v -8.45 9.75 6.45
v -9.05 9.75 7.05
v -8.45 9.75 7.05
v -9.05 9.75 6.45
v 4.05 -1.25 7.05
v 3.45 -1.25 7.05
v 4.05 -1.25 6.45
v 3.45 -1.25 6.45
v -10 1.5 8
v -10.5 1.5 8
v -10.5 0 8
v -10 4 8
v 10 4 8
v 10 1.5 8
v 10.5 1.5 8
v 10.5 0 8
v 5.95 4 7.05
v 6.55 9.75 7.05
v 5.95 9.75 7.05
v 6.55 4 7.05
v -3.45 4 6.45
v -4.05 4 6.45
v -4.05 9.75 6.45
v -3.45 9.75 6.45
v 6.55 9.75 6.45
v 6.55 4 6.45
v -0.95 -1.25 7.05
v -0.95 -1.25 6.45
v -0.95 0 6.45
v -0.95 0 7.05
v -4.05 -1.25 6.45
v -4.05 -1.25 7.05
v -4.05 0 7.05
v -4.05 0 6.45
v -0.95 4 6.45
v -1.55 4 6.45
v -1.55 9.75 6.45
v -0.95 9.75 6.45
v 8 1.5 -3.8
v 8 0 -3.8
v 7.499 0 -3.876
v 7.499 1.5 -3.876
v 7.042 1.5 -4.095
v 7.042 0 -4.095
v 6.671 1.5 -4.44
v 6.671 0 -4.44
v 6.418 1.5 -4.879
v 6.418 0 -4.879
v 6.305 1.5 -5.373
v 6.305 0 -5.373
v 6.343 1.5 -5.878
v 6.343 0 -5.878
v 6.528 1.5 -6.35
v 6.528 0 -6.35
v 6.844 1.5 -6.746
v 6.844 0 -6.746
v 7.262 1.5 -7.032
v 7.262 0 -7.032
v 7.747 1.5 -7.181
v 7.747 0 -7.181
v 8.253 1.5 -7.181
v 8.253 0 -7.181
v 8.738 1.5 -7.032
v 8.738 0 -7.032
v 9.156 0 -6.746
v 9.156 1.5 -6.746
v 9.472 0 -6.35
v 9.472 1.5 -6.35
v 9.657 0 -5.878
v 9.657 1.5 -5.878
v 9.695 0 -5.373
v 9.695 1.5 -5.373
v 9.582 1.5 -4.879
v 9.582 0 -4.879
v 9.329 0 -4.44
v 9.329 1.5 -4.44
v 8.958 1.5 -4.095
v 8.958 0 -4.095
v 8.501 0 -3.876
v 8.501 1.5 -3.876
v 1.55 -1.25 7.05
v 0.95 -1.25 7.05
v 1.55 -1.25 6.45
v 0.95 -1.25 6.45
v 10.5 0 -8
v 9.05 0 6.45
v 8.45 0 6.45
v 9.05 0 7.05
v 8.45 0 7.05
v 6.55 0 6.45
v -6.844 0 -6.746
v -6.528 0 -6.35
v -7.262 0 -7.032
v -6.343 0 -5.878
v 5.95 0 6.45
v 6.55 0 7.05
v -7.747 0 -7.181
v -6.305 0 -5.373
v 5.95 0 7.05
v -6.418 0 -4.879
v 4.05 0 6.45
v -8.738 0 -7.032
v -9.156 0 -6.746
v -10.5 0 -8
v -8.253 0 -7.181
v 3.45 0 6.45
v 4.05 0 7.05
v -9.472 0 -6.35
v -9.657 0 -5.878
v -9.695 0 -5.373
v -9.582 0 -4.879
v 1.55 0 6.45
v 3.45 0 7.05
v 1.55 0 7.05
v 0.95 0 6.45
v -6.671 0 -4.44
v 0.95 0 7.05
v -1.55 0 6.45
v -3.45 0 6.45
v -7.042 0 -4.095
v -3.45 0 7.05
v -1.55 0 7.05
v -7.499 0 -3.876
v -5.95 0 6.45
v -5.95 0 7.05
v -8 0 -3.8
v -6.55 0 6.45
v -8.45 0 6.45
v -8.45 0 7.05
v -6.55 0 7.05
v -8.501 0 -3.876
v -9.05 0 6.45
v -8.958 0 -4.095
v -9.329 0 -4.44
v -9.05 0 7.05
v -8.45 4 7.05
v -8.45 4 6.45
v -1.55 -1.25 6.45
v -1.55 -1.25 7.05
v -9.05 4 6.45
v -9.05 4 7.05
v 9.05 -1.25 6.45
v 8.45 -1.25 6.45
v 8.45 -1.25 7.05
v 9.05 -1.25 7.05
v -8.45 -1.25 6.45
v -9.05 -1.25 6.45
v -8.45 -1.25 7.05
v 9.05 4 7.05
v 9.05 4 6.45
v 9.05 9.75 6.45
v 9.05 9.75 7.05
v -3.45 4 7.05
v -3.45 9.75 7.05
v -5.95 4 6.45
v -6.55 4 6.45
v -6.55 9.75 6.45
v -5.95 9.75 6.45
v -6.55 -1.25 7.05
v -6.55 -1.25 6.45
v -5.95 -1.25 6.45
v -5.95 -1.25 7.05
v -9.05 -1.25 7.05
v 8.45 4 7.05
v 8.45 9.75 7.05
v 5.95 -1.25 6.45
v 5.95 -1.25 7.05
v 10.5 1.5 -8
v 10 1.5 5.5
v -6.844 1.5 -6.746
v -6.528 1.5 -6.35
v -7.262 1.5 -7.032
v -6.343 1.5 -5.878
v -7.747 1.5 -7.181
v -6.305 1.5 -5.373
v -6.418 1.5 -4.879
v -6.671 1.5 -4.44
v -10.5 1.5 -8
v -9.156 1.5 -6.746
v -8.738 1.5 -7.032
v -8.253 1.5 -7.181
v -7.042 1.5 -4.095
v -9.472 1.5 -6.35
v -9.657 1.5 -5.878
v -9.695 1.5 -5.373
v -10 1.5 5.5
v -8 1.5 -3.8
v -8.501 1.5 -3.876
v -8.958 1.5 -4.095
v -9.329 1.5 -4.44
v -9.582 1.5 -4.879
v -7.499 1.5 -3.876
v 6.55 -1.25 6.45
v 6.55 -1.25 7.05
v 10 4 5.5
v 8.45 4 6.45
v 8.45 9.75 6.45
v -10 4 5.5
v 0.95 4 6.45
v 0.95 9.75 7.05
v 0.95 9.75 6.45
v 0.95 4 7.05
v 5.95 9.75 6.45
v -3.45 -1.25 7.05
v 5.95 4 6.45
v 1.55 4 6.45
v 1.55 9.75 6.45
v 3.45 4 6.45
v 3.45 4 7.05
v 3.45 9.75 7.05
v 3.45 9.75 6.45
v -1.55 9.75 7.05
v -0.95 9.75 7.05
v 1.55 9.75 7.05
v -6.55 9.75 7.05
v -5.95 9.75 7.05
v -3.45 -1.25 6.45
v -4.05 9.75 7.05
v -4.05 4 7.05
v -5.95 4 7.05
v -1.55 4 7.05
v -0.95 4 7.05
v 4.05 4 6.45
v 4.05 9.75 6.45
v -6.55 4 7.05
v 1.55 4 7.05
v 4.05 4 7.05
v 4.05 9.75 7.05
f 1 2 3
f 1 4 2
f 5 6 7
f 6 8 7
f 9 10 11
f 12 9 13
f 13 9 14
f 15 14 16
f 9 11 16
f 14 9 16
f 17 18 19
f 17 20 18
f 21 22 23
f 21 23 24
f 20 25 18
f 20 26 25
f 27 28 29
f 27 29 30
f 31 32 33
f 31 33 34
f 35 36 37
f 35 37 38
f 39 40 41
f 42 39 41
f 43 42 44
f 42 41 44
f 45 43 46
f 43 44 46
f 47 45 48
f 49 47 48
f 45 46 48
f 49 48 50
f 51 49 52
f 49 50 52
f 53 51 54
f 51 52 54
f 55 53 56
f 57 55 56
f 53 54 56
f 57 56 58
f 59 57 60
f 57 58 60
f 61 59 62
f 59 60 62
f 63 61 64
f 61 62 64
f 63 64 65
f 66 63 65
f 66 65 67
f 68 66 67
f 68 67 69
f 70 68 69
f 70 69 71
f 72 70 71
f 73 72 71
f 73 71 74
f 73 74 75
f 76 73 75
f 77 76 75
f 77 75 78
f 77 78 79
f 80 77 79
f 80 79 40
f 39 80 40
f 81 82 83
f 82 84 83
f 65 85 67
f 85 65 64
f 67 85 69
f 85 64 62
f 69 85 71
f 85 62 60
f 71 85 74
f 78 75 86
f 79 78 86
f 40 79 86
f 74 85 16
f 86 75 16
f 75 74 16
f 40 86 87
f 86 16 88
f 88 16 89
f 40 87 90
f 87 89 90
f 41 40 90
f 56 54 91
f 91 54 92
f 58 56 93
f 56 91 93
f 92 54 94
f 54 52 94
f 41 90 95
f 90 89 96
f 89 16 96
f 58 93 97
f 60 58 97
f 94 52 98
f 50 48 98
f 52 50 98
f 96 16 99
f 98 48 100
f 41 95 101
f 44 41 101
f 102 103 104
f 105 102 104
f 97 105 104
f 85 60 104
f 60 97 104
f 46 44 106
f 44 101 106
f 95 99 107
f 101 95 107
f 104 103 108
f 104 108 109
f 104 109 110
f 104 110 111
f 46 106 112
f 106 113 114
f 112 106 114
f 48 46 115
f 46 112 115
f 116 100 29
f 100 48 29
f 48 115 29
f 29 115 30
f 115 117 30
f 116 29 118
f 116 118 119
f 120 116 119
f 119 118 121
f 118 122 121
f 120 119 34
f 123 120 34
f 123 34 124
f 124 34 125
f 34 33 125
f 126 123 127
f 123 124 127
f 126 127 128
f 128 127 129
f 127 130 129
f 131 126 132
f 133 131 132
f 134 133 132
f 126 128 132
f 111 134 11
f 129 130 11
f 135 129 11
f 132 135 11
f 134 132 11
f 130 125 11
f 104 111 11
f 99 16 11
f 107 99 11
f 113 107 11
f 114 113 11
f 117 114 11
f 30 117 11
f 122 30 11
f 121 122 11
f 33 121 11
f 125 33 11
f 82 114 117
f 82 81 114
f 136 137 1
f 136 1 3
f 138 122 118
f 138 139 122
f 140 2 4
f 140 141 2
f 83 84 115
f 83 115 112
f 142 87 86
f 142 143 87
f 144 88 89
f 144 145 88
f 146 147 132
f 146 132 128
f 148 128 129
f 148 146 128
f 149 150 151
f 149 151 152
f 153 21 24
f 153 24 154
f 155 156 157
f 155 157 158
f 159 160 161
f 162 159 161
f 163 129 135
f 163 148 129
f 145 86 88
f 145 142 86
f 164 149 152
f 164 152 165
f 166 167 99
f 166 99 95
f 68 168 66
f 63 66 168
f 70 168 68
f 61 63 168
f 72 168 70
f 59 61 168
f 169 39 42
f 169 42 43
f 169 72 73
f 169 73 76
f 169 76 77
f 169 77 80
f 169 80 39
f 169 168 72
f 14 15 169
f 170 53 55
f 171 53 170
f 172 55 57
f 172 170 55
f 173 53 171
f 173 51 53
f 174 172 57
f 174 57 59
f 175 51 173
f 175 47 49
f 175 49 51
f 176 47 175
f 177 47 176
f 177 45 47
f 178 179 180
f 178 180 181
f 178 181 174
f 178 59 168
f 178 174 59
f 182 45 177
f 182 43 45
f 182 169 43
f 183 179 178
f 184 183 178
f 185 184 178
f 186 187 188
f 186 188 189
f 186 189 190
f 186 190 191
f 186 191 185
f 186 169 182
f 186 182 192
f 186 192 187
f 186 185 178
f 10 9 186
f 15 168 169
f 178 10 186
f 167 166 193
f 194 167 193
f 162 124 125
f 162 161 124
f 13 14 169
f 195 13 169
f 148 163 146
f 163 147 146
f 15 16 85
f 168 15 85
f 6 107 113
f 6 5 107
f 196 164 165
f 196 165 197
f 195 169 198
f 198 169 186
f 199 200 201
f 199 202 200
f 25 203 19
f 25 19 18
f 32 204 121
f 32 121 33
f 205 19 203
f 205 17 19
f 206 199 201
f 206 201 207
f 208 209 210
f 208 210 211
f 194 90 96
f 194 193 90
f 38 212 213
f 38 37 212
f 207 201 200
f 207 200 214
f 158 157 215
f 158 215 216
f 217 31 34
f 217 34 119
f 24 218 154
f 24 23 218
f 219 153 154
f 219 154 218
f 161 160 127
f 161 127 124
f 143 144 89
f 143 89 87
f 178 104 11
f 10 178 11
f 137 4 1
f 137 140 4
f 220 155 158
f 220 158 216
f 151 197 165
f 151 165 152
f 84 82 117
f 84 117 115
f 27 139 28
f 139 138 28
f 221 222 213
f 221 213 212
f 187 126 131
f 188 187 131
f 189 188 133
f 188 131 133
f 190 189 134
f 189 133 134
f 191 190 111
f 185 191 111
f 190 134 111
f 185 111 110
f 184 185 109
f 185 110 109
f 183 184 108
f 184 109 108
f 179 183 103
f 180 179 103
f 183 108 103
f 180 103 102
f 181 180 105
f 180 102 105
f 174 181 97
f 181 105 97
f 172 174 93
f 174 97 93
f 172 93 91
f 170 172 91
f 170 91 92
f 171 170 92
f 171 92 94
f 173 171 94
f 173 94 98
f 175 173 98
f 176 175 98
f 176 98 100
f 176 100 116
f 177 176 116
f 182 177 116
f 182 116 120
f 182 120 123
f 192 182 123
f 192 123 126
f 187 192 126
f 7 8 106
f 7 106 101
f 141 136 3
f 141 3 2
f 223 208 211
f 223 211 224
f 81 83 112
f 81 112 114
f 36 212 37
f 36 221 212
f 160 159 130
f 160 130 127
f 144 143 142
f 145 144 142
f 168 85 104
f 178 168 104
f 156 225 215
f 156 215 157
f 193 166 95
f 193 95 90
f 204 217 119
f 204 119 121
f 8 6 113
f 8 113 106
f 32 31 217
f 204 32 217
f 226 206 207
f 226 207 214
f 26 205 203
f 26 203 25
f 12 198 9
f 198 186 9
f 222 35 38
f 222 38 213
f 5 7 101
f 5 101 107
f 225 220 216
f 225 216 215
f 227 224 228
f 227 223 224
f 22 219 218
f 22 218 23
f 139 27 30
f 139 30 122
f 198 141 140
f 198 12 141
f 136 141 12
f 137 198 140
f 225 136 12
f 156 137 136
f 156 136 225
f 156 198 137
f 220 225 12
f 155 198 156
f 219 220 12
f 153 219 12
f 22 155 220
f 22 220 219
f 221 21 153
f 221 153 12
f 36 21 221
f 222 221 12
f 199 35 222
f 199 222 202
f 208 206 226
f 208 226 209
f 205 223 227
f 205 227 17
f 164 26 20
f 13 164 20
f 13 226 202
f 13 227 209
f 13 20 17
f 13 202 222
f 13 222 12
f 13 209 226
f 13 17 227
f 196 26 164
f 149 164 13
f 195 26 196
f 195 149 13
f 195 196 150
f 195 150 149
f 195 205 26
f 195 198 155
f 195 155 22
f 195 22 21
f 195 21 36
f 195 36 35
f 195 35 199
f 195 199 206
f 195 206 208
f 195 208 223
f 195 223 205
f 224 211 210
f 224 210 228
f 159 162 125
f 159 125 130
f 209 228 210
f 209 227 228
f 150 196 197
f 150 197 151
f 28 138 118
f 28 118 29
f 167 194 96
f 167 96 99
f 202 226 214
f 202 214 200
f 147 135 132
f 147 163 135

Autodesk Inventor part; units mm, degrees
ref_plane "YZ Plane" through (0, 0, 0) normal (1, 0, 0) x (0, 1, 0)
ref_plane "XZ Plane" through (0, 0, 0) normal (0, 1, 0) x (-1, 0, 0)
ref_plane "XY Plane" through (0, 0, 0) normal (0, 0, 1) x (1, 0, 0)
sketch "Schizzo1" plane through (0, 0, 0) normal (0, 1, 0) x (-1, 0, 0)
  line L0 (10.5, 8) -> (-10.5, 8)
  line L1 (-10.5, 8) -> (-10.5, -8)
  line L2 (-10.5, -8) -> (10.5, -8)
  line L3 (10.5, -8) -> (10.5, 8)
  line L4 (10.5, 8) -> (-10.5, -8) construction
  line L5 (-10.5, 8) -> (10.5, -8) construction
  point P0 (0, 0)
  point P1 (0, 0)
  point P2 (0, 0)
  dimension "d0" = 16
  dimension "d1" = 21
extrude "Estrusione1" add sketch "Schizzo1" along normal blind 1.5
sketch "Schizzo2" plane through (0, 1.5, 0) normal (0, 1, 0) x (1, 0, 0)
  line L0 (10.5, 8) -> (-10.5, 8) projected
  line L1 (-10.5, 8) -> (-8, 8)
  line L2 (-8, 8) -> (-8, 5.5)
  line L3 (10.5, 8) -> (8, 8)
  line L4 (8, 8) -> (8, 5.5)
  point P0 (0, 0)
  dimension "d16" = 2.5
  dimension "d17" = 2.5
  dimension "d18" = 2.5
  dimension "d19" = 2.5
hole "Foro1" at (-8, 1.5, -5.5) at (8, 1.5, -5.5) direction (0, -1, 0) diameter 3.4 depth 1.5 tip angle 118 clearance for "Vite a testa esagonale" size "M3" standard "ANSI - Profilo M Metrico"
sketch "Schizzo4" plane through (0, 1.5, 0) normal (0, 1, 0) x (1, 0, 0)
  line L0 (10, -5.5) -> (-10, -5.5)
  line L1 (-10, -5.5) -> (-10, -8)
  line L2 (-10, -8) -> (10, -8)
  line L3 (10, -8) -> (10, -5.5)
  line L4 (10, -5.5) -> (-10, -8) construction
  line L5 (-10, -5.5) -> (10, -8) construction
  line L6 (-10.5, -8) -> (10.5, -8) projected
  point P0 (0, 0)
  point P1 (0, -6.75)
  point P2 (0, -8)
  dimension "d45" = 20
  dimension "d46" = 2.5
extrude "Estrusione2" add sketch "Schizzo4" along normal blind 2.5
sketch "Schizzo6" plane through (0, 4, 0) normal (0, 1, 0) x (1, 0, 0)
  line L0 (-8.75, -6.75) -> (-6.25, -6.75)
  line L1 (-9.05, -7.05) -> (-9.05, -6.45)
  line L2 (-9.05, -6.45) -> (-8.45, -6.45)
  line L3 (-8.45, -6.45) -> (-8.45, -7.05)
  line L4 (-8.45, -7.05) -> (-9.05, -7.05)
  line L5 (-6.25, -6.75) -> (-3.75, -6.75)
  line L6 (-6.55, -7.05) -> (-6.55, -6.45)
  line L7 (-6.55, -6.45) -> (-5.95, -6.45)
  line L8 (-5.95, -6.45) -> (-5.95, -7.05)
  line L9 (-5.95, -7.05) -> (-6.55, -7.05)
  line L10 (-3.75, -6.75) -> (-1.25, -6.75)
  line L11 (-4.05, -7.05) -> (-4.05, -6.45)
  line L12 (-4.05, -6.45) -> (-3.45, -6.45)
  line L13 (-3.45, -6.45) -> (-3.45, -7.05)
  line L14 (-3.45, -7.05) -> (-4.05, -7.05)
  line L15 (-1.25, -6.75) -> (1.25, -6.75)
  line L16 (-1.55, -7.05) -> (-1.55, -6.45)
  line L17 (-1.55, -6.45) -> (-0.95, -6.45)
  line L18 (-0.95, -6.45) -> (-0.95, -7.05)
  line L19 (-0.95, -7.05) -> (-1.55, -7.05)
  line L20 (1.25, -6.75) -> (3.75, -6.75)
  line L21 (0.95, -7.05) -> (0.95, -6.45)
  line L22 (0.95, -6.45) -> (1.55, -6.45)
  line L23 (1.55, -6.45) -> (1.55, -7.05)
  line L24 (1.55, -7.05) -> (0.95, -7.05)
  line L25 (3.75, -6.75) -> (6.25, -6.75)
  line L26 (3.45, -7.05) -> (3.45, -6.45)
  line L27 (3.45, -6.45) -> (4.05, -6.45)
  line L28 (4.05, -6.45) -> (4.05, -7.05)
  line L29 (4.05, -7.05) -> (3.45, -7.05)
  line L30 (6.25, -6.75) -> (8.75, -6.75)
  line L31 (5.95, -7.05) -> (5.95, -6.45)
  line L32 (5.95, -6.45) -> (6.55, -6.45)
  line L33 (6.55, -6.45) -> (6.55, -7.05)
  line L34 (6.55, -7.05) -> (5.95, -7.05)
  line L35 (8.45, -7.05) -> (8.45, -6.45)
  line L36 (8.45, -6.45) -> (9.05, -6.45)
  line L37 (9.05, -6.45) -> (9.05, -7.05)
  line L38 (9.05, -7.05) -> (8.45, -7.05)
  line L39 (-8.75, -6.75) -> (-10, -6.75)
  line L40 (-10, -8) -> (10, -8) projected
  line L41 (-10, -8) -> (-10, -6.75)
  line L42 (-10, -8) -> (-8.75, -8) construction
  point P0 (0, 0)
  dimension "d47" = 2.5
  dimension "d48" = 0.6
  dimension "d49" = 2.5
  dimension "d50" = 0.6
  dimension "d51" = 2.5
  dimension "d52" = 0.6
  dimension "d53" = 2.5
  dimension "d54" = 0.6
  dimension "d55" = 2.5
  dimension "d56" = 0.6
  dimension "d57" = 2.5
  dimension "d58" = 0.6
  dimension "d59" = 2.5
  dimension "d60" = 0.6
  dimension "d62" = 0.6
  dimension "d63" = 1.25
  dimension "d64" = 1.25
  dimension "d65" = 90
extrude "Estrusione3" add sketch "Schizzo6" along normal blind 5.75 and the other way blind 5.25
properties part number "10_MPU_6050"
